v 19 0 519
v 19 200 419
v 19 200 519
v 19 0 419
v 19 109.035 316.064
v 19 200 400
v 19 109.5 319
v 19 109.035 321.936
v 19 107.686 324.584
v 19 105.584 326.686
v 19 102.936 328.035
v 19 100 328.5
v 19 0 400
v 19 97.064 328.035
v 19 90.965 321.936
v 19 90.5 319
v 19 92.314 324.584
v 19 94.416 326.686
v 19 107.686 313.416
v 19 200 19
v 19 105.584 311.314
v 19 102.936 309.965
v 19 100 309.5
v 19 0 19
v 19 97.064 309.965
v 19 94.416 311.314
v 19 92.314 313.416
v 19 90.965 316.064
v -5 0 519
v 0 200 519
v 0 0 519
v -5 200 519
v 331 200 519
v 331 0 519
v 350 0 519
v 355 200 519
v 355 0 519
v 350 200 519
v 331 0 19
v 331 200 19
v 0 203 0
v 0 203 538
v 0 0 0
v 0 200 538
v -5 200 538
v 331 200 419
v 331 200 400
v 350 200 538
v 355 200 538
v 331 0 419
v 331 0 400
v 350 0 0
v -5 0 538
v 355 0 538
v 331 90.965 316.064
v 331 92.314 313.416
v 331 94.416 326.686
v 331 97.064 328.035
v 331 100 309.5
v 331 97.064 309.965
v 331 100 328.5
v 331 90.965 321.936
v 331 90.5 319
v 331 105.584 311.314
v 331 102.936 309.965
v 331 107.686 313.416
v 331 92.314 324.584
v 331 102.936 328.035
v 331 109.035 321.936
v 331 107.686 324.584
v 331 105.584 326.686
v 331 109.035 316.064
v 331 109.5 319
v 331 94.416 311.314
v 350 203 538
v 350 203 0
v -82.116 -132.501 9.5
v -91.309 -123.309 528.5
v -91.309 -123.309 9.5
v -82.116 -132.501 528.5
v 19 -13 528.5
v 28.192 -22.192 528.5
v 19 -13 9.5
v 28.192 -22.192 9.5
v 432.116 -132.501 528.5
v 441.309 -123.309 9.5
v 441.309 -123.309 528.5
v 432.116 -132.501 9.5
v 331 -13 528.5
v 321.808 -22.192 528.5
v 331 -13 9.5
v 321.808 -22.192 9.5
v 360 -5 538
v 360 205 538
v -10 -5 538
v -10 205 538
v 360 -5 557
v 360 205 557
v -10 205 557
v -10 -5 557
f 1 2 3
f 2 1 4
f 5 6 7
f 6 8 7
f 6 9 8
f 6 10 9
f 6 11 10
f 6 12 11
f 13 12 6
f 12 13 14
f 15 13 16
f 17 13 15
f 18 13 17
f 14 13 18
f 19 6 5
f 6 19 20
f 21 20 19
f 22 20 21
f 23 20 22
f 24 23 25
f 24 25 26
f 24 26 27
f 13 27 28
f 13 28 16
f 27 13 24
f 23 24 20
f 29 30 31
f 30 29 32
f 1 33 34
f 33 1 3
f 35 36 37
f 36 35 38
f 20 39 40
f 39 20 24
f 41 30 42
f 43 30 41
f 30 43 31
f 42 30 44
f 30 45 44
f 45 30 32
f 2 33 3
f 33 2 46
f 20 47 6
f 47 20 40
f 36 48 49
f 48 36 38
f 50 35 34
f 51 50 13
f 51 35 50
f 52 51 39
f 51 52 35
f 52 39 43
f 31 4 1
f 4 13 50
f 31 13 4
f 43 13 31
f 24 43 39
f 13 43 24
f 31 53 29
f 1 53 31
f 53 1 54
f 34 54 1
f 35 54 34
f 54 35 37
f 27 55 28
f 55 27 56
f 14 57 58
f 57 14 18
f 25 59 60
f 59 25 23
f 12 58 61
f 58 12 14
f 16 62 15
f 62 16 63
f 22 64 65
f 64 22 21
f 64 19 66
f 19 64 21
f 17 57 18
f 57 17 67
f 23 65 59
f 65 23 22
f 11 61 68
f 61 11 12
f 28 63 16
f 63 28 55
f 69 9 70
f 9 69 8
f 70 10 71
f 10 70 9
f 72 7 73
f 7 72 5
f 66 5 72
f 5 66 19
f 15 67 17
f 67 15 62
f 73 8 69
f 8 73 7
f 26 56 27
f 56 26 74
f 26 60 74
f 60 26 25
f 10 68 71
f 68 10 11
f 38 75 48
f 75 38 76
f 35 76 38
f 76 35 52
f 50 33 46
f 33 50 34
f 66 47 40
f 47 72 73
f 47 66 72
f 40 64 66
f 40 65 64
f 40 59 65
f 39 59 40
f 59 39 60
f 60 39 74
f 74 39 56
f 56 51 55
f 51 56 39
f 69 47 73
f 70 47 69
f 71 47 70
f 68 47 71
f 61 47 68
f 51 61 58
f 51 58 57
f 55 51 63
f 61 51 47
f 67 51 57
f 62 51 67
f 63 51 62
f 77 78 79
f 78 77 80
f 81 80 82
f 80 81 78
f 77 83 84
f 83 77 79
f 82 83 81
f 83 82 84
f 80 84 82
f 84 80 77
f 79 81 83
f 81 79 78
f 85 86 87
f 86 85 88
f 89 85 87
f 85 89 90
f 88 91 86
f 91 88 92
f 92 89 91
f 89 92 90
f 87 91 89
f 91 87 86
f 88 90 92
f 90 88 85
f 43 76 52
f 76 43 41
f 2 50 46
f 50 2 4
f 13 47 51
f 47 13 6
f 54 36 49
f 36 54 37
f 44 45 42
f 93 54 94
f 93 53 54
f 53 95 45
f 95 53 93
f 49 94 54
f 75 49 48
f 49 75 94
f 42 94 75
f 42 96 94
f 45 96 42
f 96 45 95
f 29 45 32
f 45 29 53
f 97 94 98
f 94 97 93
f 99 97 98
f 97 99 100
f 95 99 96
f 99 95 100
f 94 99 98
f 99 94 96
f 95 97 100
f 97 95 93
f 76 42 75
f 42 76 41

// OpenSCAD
// sides 2@7"x19.5"
// bottom 1@7"x13.5"
// top1 1@7"x14"
// top2 1@7.5"x15"
// door 2@6.25"x20"
// shelf 1@7"x12"
// shelfOffset 4"

$fn = 20;

// Parameters
depth = 200; // 7in
width = 350; //13.5in
height = 500; //19.5in

thickness = 19; // 0.75in
doorThickness = 13; // 0.5in

shelfOffset = 100; // 4in
topOverhang = 5; //0.25in

angle = 135;
assembly();

dowel = 19;    // 0.75in
dowelOffset = 300; // 12in

//door();

module assembly() {
    bottom();

    translate([0,0,thickness]) {
        color("pink")
        side();
        
        translate([width-thickness,0,0])
        color("pink")
        side();
    }
    
    translate([0, -doorThickness, thickness/2]) {
        translate([thickness,0,0]) {
            rotate([0,0,-angle])
            door();
        }
        
        translate([(width-thickness), 0, 0]) {
            
            mirror([1,0,0])
            rotate([0,0,-angle])
            door();
        }
    }
    
    translate([0, depth/2, thickness + dowelOffset]) {
        rotate([0,90,0])
        dowel();
    }
    
    translate([thickness,0,(height+thickness-shelfOffset-thickness)]) {
        shelf();
    }
    
    translate([-topOverhang, 0, thickness+height]) {
        top1();
    }
    
    translate([-2*topOverhang, -topOverhang, thickness+height+thickness]) {
        top2();
    }
    translate([0,depth, 0]) {
        back();
    }
}

module bottom() {
    w = width;
    d = depth;
    t = thickness;
    
    echo("Bottom: ", w, d, t);
    
    color("orange")
    cube([w,d, t]);
}

module side() {
    w = thickness;
    d = depth;
    t = height;
    
    echo("Side: ", t, d, w);
    
    color("pink")
    difference() {
        cube([w, d, t]);
        translate([0, depth/2, dowelOffset]) {
            rotate([0, 90, 0])
            cylinder(d=dowel, h=thickness);
        }
    }
}

module top1() {
    w = width+2*topOverhang;
    d = depth;
    t = thickness;
    
    echo("Top1: ", w, d, t);
    
    color("lightBlue")
    cube([w, d, t]);
}

module top2() {
    w = width+4*topOverhang;
    d = depth + 2*topOverhang;
    t = thickness;
    
    echo("Top2: ", w, d, t);
    
    color("blue")
    cube([w, d, t]);
}
module door() {
    doorWidth = width/2 - thickness;
    
    w = width/2 - thickness;
    d = doorThickness;
    t = height + thickness;
    
    echo("Door: ", t, w, d);
    
    color("green")
    cube([w, d, t]);
}
module shelf() {
    w = width - 2*thickness;
    d = depth;
    t = thickness;
    
    echo("Shelf: ", w, d, t);
    
    color("yellow");
    cube([w, d, t]);
}
module dowel() {
    d=dowel;
    l=width;
    
    echo("Dowel: ", l, d);
    
    color("brown")
    cylinder(d=d, h=l);
}
module back() {
    w = width;
    h = height + 2 * thickness;
    t = 3;
    
    echo("back: ", w, h, t);
    
    color("gray")
    cube([w, t, h]);
}
    
